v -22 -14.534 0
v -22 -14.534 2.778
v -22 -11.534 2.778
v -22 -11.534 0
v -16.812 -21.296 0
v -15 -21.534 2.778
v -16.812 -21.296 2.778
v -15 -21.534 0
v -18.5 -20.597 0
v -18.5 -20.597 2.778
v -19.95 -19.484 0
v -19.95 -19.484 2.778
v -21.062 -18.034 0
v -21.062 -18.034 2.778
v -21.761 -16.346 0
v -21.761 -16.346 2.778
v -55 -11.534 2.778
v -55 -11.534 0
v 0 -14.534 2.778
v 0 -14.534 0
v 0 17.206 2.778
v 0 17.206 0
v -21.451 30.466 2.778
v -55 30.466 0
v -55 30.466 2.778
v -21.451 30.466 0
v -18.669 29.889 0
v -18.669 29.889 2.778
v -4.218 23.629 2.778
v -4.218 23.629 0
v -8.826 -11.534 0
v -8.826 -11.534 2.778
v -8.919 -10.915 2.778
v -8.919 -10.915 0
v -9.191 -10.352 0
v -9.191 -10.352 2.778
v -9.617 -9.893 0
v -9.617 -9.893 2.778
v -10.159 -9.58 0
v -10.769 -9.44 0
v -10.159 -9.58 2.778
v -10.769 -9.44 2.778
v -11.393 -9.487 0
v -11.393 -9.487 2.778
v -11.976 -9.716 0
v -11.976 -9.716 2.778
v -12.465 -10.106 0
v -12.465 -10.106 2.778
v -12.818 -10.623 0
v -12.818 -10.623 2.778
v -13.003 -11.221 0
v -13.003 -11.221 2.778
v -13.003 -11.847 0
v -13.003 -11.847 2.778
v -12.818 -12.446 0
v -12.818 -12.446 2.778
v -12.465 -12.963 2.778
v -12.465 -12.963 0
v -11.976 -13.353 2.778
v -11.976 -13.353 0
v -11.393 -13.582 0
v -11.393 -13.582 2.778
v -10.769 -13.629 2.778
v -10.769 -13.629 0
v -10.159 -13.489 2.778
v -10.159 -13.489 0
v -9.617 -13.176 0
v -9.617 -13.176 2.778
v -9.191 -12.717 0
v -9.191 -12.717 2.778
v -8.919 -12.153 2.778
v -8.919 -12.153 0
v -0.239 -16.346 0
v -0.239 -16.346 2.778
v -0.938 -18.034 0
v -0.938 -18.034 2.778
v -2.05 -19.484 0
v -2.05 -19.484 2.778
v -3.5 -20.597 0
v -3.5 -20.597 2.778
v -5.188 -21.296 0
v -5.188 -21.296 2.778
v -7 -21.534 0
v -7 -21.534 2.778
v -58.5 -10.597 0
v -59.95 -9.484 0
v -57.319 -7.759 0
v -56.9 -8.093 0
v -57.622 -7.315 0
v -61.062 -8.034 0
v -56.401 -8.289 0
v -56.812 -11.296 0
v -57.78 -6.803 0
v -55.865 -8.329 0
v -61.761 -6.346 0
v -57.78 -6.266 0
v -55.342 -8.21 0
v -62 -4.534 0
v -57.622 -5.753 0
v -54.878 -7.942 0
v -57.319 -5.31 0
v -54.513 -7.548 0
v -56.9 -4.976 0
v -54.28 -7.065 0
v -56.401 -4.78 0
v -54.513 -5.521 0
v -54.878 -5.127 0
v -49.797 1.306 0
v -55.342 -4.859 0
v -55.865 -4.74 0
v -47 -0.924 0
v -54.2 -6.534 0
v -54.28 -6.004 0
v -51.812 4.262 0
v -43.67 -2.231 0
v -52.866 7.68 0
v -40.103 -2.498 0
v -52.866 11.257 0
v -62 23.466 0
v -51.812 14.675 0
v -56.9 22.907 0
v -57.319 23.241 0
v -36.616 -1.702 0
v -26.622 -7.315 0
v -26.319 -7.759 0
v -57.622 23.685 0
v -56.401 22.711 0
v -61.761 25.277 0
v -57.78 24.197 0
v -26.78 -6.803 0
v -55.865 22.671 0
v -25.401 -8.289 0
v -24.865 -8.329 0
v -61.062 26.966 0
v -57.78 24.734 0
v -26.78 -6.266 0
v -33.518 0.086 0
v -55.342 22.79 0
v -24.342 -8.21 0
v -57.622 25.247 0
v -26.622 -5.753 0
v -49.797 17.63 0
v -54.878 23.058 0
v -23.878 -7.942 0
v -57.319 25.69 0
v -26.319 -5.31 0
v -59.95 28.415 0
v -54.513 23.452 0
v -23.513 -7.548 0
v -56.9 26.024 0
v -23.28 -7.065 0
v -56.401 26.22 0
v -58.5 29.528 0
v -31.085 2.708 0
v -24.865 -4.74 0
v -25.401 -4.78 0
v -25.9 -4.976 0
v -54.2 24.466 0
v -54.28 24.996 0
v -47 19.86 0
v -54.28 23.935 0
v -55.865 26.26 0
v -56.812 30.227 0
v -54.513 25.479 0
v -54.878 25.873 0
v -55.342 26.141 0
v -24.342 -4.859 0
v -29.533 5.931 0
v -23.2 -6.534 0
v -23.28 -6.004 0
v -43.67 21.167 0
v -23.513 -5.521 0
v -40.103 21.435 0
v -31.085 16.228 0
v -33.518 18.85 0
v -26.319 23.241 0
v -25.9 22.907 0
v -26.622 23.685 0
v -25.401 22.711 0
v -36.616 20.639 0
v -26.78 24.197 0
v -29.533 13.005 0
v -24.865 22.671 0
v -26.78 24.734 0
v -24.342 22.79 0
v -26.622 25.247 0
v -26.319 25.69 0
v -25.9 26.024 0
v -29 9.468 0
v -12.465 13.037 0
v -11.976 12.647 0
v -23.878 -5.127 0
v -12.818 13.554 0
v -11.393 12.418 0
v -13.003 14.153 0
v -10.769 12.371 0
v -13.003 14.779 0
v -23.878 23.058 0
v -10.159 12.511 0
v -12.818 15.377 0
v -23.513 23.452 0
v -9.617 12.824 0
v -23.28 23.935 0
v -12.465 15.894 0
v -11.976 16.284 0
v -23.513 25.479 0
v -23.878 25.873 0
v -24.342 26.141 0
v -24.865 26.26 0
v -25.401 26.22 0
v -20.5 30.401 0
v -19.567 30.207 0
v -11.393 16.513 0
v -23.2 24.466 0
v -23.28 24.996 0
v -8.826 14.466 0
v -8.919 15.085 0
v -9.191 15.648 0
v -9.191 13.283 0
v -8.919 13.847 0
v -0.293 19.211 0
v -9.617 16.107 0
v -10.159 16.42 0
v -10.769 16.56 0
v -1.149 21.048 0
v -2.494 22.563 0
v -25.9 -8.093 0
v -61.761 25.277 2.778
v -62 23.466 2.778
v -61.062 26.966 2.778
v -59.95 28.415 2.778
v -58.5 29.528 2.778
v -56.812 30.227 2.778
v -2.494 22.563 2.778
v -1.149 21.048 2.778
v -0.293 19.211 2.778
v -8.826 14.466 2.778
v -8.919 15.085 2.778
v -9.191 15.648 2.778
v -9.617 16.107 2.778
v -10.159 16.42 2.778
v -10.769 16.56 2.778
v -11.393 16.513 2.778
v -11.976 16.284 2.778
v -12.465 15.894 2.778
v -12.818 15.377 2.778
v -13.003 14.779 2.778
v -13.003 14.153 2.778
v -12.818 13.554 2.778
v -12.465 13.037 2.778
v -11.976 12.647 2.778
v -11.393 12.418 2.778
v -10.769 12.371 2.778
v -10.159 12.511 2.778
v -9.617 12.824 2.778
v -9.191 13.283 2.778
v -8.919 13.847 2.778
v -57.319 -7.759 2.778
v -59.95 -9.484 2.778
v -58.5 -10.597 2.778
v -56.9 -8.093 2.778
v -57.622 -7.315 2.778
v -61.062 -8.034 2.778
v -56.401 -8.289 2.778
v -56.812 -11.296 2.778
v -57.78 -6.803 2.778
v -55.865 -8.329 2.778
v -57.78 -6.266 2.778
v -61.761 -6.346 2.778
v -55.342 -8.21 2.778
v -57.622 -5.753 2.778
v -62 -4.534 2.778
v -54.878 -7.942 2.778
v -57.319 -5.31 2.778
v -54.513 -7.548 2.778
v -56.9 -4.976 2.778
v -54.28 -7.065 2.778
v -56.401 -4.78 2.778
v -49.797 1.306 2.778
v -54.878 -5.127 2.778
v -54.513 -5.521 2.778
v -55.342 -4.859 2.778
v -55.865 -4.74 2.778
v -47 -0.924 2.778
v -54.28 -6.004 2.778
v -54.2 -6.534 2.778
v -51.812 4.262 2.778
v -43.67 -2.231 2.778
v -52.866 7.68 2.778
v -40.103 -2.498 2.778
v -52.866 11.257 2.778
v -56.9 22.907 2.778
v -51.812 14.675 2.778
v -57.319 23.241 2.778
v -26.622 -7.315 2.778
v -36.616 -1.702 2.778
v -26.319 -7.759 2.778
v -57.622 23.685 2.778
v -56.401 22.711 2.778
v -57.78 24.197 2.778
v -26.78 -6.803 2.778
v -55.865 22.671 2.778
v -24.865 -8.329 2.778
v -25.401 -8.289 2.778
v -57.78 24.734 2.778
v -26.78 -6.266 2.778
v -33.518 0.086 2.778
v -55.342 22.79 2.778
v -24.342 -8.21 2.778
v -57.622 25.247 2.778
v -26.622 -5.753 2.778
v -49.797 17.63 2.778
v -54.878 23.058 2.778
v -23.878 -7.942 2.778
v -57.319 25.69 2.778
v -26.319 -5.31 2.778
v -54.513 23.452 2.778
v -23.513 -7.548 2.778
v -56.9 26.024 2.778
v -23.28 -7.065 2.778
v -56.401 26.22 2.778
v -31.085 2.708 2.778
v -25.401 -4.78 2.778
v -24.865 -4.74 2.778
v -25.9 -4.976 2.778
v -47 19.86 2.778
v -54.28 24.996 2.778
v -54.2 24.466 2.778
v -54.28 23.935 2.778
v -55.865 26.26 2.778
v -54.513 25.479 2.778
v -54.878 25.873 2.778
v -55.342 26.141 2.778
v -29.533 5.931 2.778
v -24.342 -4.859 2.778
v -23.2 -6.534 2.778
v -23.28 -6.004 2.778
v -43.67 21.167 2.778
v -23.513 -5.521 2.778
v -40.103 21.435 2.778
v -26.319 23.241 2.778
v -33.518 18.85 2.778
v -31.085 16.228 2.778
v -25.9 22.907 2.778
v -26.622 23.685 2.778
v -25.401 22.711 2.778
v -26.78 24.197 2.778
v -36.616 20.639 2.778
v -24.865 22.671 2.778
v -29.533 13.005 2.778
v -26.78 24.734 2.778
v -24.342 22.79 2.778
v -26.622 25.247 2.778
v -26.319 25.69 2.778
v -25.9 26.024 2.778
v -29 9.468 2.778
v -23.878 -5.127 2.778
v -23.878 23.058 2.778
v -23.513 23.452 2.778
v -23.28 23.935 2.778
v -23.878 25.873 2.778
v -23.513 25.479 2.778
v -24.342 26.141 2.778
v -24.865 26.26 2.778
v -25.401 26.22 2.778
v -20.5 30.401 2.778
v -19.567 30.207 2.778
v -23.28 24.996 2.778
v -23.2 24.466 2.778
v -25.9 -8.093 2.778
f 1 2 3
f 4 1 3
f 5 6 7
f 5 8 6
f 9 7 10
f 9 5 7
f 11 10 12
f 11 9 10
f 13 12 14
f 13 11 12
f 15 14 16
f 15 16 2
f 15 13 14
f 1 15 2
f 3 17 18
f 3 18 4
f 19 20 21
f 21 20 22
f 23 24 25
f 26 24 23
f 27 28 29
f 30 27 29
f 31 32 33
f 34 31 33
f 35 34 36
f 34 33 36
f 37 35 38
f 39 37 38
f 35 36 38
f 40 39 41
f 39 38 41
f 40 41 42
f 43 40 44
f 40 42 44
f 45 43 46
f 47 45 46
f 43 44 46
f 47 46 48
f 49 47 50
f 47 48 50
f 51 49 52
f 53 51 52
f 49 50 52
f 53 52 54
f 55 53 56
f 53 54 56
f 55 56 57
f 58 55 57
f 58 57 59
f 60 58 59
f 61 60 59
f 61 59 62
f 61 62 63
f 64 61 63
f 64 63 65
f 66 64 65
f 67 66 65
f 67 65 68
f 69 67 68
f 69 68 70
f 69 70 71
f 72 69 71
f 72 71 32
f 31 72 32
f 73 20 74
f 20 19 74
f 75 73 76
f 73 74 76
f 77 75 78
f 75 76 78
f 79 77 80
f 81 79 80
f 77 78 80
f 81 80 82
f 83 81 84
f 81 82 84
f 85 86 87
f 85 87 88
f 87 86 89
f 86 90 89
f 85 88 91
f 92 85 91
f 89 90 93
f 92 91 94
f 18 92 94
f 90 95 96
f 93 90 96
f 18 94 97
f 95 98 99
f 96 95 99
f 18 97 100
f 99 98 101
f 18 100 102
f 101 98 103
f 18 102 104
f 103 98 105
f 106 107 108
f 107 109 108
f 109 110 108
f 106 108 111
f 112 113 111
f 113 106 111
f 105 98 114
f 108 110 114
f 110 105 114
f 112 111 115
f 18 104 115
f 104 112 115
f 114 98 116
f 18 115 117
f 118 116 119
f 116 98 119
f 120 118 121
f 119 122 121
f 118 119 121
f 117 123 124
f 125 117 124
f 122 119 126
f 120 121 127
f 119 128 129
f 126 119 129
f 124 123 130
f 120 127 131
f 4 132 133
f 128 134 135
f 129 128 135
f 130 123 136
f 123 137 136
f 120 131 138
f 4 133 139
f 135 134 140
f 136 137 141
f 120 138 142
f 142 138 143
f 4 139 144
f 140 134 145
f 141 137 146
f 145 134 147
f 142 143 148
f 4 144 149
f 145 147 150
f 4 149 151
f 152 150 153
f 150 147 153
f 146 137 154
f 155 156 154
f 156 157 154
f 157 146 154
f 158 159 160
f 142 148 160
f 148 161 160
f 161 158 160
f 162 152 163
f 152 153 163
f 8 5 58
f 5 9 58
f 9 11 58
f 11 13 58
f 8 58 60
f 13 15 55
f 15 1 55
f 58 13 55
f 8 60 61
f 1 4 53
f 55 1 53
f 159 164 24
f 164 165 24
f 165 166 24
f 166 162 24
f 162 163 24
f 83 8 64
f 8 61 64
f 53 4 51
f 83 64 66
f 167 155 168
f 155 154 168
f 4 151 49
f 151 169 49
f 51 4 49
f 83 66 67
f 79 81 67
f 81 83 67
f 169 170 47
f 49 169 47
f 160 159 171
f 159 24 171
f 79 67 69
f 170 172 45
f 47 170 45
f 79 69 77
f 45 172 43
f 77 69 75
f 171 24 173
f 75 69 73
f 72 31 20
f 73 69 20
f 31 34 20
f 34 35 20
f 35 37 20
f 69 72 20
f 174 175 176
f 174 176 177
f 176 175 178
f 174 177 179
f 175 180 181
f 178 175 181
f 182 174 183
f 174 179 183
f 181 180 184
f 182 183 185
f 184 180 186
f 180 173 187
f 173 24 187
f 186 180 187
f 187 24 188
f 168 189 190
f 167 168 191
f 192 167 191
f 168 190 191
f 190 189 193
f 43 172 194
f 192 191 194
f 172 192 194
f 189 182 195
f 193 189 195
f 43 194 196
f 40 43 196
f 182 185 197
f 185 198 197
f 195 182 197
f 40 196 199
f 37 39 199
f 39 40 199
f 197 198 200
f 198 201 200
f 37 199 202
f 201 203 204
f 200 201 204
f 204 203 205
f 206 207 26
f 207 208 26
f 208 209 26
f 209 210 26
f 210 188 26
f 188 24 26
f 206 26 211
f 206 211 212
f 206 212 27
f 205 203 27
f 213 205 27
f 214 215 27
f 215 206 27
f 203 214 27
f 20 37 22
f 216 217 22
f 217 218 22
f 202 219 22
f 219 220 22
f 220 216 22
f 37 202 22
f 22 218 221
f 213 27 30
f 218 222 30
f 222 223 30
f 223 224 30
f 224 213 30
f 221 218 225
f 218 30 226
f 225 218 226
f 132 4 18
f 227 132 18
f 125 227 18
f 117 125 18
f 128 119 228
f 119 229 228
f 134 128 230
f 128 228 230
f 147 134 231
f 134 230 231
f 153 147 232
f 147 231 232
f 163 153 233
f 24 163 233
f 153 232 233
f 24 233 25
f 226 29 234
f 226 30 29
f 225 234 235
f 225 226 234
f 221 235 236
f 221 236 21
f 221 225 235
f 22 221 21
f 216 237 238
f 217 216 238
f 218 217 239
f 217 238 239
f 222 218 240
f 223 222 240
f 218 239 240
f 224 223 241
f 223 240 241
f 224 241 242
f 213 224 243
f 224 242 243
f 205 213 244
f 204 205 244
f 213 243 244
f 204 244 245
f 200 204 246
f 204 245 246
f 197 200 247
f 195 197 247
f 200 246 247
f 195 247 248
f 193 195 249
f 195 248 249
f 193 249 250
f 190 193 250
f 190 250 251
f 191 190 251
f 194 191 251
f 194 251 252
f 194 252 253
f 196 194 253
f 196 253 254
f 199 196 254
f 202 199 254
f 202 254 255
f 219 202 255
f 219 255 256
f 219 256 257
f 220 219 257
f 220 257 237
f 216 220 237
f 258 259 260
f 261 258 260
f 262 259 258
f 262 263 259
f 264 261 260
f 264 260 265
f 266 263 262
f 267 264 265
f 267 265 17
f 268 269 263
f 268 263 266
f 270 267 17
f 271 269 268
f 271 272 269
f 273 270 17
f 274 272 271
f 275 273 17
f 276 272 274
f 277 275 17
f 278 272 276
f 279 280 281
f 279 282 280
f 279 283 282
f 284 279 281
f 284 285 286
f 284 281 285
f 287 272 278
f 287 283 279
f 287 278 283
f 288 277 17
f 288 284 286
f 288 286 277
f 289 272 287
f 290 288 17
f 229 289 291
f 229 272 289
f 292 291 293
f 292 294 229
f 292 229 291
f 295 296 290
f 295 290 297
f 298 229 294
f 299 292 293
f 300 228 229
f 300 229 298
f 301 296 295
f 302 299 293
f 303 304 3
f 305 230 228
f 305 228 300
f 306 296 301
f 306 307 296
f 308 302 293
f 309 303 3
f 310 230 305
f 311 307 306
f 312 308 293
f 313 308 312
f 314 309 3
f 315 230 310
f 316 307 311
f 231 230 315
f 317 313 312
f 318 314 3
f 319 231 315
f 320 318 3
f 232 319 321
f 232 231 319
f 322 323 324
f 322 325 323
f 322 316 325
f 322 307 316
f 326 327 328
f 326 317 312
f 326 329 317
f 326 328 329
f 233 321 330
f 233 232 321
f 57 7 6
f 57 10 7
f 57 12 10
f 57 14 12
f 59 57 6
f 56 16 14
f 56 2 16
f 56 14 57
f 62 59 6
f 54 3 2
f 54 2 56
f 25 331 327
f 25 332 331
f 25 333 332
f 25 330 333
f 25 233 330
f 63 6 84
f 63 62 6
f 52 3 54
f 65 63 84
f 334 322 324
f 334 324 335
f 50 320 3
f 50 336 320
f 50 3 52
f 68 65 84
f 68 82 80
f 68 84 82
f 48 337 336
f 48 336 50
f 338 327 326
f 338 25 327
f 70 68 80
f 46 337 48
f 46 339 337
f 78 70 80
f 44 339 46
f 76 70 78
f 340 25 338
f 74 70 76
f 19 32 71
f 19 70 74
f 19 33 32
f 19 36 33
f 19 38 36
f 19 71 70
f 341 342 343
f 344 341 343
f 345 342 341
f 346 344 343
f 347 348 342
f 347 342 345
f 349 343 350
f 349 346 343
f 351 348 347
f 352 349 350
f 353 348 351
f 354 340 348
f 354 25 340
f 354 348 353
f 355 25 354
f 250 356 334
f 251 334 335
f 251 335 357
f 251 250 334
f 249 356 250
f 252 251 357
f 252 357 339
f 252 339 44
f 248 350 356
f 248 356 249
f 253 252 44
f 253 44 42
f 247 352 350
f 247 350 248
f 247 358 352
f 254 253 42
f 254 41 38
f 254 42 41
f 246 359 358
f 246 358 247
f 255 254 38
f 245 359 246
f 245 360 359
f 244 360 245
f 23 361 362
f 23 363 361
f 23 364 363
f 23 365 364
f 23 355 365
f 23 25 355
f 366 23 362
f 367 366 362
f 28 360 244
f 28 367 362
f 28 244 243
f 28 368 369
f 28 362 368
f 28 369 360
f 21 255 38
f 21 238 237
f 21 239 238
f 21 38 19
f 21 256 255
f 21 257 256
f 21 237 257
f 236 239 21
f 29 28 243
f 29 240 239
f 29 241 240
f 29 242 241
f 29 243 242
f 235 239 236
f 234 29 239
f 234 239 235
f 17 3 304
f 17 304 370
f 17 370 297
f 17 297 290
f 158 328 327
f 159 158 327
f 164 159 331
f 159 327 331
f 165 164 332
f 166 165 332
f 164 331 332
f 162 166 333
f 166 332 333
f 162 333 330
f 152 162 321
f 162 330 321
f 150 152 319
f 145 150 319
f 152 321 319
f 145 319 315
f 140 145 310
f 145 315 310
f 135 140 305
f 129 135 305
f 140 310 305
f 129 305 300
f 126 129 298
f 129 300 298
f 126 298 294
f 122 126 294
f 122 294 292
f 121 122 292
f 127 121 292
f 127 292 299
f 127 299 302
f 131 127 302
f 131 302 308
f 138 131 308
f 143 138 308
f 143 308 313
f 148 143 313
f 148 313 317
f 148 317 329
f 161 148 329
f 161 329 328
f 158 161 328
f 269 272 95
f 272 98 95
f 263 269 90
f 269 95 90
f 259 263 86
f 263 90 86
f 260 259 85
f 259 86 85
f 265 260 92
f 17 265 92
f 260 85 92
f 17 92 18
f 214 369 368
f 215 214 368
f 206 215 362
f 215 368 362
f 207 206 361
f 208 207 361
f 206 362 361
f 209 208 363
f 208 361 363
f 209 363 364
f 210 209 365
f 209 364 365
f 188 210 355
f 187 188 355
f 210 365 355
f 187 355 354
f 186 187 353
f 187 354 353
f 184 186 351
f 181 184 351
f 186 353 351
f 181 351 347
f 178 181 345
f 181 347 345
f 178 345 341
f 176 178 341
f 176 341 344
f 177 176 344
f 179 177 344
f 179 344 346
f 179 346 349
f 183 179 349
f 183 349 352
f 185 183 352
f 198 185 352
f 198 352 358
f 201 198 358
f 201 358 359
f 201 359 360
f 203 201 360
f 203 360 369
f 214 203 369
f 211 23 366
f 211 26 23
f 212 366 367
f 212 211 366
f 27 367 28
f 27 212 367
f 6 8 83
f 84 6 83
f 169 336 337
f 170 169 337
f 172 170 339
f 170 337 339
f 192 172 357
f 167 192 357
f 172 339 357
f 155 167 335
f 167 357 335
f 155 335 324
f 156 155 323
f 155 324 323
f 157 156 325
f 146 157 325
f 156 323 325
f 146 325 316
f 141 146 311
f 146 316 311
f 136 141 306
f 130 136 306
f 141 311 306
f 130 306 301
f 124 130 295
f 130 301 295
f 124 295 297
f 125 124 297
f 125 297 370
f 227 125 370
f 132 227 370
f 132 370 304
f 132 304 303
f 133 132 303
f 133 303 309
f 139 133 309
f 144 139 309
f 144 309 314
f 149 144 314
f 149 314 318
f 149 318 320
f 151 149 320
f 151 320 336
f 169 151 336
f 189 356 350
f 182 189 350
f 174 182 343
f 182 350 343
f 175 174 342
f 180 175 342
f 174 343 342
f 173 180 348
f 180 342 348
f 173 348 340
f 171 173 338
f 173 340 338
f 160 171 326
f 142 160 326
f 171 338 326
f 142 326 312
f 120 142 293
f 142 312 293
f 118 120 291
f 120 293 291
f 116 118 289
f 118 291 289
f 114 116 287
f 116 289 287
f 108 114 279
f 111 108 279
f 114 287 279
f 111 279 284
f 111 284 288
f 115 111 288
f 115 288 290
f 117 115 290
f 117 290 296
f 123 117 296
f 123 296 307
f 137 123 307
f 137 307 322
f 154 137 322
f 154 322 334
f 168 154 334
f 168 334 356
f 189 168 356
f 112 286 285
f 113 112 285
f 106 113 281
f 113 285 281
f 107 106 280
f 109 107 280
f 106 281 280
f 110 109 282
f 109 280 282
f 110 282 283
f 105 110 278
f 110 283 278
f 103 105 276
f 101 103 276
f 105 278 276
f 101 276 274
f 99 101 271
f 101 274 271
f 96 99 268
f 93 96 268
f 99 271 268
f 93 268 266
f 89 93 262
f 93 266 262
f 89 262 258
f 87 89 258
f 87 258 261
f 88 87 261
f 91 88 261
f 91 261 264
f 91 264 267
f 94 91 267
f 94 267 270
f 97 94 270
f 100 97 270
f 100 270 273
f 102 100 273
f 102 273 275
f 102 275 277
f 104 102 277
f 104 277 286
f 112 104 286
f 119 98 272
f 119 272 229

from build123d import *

# Parameters (mm, degrees)
SKETCH1_W           = 62
SKETCH1_H           = 52
BOSS_EXTRUDE1_DEPTH = 2.778125
CUT_EXTRUDE1_DEPTH  = 10
SKETCH2_W           = 40
SKETCH2_H           = 10
CUT_EXTRUDE2_DEPTH  = 10
FILLET1_R           = 7
FILLET2_R           = 7
SKETCH4_R           = 2.1
SKETCH4_R_2         = 1.8
SKETCH4_R_3         = 12
CUT_EXTRUDE3_DEPTH  = 10


with BuildPart() as part:
    # Sketch1 → Boss-Extrude1 (new body)
    with BuildSketch(Plane.XY):
        with Locations((-31, 4.465517241)):
            Rectangle(SKETCH1_W, SKETCH1_H)
    extrude(amount=BOSS_EXTRUDE1_DEPTH)

    # Sketch3 → Cut-Extrude1 (cut)
    with BuildSketch(Plane.XY.offset(2.778125)):
        Polygon((-20, 30.465517241), (0, 21.802451622), (0, 30.465517241), align=None)
    extrude(amount=-CUT_EXTRUDE1_DEPTH, mode=Mode.SUBTRACT)

    # Sketch2 → Cut-Extrude2 (cut)
    with BuildSketch(Plane.XY.offset(2.778125)):
        with Locations((-42, -16.534482759)):
            Rectangle(SKETCH2_W, SKETCH2_H)
    extrude(amount=-CUT_EXTRUDE2_DEPTH, mode=Mode.SUBTRACT)

    # Fillet1
    fillet1_edges = [part.edges().sort_by_distance(p)[0] for p in [
        (-62, -11.534482759, 1.3890625),
        (-22, -21.534482759, 1.3890625),
        (-62, 30.465517241, 1.3890625),
        (0, -21.534482759, 1.3890625),
    ]]
    fillet(fillet1_edges, radius=FILLET1_R)

    # Fillet2
    fillet2_edges = [part.edges().sort_by_distance(p)[0] for p in [
        (0, 21.802451622, 1.3890625),
        (-20, 30.465517241, 1.3890625),
    ]]
    fillet(fillet2_edges, radius=FILLET2_R)

    # Sketch4 → Cut-Extrude3 (cut)
    with BuildSketch(Plane.XY.offset(2.778125)):
        with Locations((-10.925971148, -11.534482759)):
            Circle(SKETCH4_R)
        with Locations((-10.925971148, 14.465517241)):
            Circle(SKETCH4_R)
        with Locations((-56, -6.534482759)):
            Circle(SKETCH4_R_2)
        with Locations((-56, 24.465517241)):
            Circle(SKETCH4_R_2)
        with Locations((-25, 24.465517241)):
            Circle(SKETCH4_R_2)
        with Locations((-25, -6.534482759)):
            Circle(SKETCH4_R_2)
        with Locations((-41, 9.468169555)):
            Circle(SKETCH4_R_3)
    extrude(amount=-CUT_EXTRUDE3_DEPTH, mode=Mode.SUBTRACT)


solid = part.part
